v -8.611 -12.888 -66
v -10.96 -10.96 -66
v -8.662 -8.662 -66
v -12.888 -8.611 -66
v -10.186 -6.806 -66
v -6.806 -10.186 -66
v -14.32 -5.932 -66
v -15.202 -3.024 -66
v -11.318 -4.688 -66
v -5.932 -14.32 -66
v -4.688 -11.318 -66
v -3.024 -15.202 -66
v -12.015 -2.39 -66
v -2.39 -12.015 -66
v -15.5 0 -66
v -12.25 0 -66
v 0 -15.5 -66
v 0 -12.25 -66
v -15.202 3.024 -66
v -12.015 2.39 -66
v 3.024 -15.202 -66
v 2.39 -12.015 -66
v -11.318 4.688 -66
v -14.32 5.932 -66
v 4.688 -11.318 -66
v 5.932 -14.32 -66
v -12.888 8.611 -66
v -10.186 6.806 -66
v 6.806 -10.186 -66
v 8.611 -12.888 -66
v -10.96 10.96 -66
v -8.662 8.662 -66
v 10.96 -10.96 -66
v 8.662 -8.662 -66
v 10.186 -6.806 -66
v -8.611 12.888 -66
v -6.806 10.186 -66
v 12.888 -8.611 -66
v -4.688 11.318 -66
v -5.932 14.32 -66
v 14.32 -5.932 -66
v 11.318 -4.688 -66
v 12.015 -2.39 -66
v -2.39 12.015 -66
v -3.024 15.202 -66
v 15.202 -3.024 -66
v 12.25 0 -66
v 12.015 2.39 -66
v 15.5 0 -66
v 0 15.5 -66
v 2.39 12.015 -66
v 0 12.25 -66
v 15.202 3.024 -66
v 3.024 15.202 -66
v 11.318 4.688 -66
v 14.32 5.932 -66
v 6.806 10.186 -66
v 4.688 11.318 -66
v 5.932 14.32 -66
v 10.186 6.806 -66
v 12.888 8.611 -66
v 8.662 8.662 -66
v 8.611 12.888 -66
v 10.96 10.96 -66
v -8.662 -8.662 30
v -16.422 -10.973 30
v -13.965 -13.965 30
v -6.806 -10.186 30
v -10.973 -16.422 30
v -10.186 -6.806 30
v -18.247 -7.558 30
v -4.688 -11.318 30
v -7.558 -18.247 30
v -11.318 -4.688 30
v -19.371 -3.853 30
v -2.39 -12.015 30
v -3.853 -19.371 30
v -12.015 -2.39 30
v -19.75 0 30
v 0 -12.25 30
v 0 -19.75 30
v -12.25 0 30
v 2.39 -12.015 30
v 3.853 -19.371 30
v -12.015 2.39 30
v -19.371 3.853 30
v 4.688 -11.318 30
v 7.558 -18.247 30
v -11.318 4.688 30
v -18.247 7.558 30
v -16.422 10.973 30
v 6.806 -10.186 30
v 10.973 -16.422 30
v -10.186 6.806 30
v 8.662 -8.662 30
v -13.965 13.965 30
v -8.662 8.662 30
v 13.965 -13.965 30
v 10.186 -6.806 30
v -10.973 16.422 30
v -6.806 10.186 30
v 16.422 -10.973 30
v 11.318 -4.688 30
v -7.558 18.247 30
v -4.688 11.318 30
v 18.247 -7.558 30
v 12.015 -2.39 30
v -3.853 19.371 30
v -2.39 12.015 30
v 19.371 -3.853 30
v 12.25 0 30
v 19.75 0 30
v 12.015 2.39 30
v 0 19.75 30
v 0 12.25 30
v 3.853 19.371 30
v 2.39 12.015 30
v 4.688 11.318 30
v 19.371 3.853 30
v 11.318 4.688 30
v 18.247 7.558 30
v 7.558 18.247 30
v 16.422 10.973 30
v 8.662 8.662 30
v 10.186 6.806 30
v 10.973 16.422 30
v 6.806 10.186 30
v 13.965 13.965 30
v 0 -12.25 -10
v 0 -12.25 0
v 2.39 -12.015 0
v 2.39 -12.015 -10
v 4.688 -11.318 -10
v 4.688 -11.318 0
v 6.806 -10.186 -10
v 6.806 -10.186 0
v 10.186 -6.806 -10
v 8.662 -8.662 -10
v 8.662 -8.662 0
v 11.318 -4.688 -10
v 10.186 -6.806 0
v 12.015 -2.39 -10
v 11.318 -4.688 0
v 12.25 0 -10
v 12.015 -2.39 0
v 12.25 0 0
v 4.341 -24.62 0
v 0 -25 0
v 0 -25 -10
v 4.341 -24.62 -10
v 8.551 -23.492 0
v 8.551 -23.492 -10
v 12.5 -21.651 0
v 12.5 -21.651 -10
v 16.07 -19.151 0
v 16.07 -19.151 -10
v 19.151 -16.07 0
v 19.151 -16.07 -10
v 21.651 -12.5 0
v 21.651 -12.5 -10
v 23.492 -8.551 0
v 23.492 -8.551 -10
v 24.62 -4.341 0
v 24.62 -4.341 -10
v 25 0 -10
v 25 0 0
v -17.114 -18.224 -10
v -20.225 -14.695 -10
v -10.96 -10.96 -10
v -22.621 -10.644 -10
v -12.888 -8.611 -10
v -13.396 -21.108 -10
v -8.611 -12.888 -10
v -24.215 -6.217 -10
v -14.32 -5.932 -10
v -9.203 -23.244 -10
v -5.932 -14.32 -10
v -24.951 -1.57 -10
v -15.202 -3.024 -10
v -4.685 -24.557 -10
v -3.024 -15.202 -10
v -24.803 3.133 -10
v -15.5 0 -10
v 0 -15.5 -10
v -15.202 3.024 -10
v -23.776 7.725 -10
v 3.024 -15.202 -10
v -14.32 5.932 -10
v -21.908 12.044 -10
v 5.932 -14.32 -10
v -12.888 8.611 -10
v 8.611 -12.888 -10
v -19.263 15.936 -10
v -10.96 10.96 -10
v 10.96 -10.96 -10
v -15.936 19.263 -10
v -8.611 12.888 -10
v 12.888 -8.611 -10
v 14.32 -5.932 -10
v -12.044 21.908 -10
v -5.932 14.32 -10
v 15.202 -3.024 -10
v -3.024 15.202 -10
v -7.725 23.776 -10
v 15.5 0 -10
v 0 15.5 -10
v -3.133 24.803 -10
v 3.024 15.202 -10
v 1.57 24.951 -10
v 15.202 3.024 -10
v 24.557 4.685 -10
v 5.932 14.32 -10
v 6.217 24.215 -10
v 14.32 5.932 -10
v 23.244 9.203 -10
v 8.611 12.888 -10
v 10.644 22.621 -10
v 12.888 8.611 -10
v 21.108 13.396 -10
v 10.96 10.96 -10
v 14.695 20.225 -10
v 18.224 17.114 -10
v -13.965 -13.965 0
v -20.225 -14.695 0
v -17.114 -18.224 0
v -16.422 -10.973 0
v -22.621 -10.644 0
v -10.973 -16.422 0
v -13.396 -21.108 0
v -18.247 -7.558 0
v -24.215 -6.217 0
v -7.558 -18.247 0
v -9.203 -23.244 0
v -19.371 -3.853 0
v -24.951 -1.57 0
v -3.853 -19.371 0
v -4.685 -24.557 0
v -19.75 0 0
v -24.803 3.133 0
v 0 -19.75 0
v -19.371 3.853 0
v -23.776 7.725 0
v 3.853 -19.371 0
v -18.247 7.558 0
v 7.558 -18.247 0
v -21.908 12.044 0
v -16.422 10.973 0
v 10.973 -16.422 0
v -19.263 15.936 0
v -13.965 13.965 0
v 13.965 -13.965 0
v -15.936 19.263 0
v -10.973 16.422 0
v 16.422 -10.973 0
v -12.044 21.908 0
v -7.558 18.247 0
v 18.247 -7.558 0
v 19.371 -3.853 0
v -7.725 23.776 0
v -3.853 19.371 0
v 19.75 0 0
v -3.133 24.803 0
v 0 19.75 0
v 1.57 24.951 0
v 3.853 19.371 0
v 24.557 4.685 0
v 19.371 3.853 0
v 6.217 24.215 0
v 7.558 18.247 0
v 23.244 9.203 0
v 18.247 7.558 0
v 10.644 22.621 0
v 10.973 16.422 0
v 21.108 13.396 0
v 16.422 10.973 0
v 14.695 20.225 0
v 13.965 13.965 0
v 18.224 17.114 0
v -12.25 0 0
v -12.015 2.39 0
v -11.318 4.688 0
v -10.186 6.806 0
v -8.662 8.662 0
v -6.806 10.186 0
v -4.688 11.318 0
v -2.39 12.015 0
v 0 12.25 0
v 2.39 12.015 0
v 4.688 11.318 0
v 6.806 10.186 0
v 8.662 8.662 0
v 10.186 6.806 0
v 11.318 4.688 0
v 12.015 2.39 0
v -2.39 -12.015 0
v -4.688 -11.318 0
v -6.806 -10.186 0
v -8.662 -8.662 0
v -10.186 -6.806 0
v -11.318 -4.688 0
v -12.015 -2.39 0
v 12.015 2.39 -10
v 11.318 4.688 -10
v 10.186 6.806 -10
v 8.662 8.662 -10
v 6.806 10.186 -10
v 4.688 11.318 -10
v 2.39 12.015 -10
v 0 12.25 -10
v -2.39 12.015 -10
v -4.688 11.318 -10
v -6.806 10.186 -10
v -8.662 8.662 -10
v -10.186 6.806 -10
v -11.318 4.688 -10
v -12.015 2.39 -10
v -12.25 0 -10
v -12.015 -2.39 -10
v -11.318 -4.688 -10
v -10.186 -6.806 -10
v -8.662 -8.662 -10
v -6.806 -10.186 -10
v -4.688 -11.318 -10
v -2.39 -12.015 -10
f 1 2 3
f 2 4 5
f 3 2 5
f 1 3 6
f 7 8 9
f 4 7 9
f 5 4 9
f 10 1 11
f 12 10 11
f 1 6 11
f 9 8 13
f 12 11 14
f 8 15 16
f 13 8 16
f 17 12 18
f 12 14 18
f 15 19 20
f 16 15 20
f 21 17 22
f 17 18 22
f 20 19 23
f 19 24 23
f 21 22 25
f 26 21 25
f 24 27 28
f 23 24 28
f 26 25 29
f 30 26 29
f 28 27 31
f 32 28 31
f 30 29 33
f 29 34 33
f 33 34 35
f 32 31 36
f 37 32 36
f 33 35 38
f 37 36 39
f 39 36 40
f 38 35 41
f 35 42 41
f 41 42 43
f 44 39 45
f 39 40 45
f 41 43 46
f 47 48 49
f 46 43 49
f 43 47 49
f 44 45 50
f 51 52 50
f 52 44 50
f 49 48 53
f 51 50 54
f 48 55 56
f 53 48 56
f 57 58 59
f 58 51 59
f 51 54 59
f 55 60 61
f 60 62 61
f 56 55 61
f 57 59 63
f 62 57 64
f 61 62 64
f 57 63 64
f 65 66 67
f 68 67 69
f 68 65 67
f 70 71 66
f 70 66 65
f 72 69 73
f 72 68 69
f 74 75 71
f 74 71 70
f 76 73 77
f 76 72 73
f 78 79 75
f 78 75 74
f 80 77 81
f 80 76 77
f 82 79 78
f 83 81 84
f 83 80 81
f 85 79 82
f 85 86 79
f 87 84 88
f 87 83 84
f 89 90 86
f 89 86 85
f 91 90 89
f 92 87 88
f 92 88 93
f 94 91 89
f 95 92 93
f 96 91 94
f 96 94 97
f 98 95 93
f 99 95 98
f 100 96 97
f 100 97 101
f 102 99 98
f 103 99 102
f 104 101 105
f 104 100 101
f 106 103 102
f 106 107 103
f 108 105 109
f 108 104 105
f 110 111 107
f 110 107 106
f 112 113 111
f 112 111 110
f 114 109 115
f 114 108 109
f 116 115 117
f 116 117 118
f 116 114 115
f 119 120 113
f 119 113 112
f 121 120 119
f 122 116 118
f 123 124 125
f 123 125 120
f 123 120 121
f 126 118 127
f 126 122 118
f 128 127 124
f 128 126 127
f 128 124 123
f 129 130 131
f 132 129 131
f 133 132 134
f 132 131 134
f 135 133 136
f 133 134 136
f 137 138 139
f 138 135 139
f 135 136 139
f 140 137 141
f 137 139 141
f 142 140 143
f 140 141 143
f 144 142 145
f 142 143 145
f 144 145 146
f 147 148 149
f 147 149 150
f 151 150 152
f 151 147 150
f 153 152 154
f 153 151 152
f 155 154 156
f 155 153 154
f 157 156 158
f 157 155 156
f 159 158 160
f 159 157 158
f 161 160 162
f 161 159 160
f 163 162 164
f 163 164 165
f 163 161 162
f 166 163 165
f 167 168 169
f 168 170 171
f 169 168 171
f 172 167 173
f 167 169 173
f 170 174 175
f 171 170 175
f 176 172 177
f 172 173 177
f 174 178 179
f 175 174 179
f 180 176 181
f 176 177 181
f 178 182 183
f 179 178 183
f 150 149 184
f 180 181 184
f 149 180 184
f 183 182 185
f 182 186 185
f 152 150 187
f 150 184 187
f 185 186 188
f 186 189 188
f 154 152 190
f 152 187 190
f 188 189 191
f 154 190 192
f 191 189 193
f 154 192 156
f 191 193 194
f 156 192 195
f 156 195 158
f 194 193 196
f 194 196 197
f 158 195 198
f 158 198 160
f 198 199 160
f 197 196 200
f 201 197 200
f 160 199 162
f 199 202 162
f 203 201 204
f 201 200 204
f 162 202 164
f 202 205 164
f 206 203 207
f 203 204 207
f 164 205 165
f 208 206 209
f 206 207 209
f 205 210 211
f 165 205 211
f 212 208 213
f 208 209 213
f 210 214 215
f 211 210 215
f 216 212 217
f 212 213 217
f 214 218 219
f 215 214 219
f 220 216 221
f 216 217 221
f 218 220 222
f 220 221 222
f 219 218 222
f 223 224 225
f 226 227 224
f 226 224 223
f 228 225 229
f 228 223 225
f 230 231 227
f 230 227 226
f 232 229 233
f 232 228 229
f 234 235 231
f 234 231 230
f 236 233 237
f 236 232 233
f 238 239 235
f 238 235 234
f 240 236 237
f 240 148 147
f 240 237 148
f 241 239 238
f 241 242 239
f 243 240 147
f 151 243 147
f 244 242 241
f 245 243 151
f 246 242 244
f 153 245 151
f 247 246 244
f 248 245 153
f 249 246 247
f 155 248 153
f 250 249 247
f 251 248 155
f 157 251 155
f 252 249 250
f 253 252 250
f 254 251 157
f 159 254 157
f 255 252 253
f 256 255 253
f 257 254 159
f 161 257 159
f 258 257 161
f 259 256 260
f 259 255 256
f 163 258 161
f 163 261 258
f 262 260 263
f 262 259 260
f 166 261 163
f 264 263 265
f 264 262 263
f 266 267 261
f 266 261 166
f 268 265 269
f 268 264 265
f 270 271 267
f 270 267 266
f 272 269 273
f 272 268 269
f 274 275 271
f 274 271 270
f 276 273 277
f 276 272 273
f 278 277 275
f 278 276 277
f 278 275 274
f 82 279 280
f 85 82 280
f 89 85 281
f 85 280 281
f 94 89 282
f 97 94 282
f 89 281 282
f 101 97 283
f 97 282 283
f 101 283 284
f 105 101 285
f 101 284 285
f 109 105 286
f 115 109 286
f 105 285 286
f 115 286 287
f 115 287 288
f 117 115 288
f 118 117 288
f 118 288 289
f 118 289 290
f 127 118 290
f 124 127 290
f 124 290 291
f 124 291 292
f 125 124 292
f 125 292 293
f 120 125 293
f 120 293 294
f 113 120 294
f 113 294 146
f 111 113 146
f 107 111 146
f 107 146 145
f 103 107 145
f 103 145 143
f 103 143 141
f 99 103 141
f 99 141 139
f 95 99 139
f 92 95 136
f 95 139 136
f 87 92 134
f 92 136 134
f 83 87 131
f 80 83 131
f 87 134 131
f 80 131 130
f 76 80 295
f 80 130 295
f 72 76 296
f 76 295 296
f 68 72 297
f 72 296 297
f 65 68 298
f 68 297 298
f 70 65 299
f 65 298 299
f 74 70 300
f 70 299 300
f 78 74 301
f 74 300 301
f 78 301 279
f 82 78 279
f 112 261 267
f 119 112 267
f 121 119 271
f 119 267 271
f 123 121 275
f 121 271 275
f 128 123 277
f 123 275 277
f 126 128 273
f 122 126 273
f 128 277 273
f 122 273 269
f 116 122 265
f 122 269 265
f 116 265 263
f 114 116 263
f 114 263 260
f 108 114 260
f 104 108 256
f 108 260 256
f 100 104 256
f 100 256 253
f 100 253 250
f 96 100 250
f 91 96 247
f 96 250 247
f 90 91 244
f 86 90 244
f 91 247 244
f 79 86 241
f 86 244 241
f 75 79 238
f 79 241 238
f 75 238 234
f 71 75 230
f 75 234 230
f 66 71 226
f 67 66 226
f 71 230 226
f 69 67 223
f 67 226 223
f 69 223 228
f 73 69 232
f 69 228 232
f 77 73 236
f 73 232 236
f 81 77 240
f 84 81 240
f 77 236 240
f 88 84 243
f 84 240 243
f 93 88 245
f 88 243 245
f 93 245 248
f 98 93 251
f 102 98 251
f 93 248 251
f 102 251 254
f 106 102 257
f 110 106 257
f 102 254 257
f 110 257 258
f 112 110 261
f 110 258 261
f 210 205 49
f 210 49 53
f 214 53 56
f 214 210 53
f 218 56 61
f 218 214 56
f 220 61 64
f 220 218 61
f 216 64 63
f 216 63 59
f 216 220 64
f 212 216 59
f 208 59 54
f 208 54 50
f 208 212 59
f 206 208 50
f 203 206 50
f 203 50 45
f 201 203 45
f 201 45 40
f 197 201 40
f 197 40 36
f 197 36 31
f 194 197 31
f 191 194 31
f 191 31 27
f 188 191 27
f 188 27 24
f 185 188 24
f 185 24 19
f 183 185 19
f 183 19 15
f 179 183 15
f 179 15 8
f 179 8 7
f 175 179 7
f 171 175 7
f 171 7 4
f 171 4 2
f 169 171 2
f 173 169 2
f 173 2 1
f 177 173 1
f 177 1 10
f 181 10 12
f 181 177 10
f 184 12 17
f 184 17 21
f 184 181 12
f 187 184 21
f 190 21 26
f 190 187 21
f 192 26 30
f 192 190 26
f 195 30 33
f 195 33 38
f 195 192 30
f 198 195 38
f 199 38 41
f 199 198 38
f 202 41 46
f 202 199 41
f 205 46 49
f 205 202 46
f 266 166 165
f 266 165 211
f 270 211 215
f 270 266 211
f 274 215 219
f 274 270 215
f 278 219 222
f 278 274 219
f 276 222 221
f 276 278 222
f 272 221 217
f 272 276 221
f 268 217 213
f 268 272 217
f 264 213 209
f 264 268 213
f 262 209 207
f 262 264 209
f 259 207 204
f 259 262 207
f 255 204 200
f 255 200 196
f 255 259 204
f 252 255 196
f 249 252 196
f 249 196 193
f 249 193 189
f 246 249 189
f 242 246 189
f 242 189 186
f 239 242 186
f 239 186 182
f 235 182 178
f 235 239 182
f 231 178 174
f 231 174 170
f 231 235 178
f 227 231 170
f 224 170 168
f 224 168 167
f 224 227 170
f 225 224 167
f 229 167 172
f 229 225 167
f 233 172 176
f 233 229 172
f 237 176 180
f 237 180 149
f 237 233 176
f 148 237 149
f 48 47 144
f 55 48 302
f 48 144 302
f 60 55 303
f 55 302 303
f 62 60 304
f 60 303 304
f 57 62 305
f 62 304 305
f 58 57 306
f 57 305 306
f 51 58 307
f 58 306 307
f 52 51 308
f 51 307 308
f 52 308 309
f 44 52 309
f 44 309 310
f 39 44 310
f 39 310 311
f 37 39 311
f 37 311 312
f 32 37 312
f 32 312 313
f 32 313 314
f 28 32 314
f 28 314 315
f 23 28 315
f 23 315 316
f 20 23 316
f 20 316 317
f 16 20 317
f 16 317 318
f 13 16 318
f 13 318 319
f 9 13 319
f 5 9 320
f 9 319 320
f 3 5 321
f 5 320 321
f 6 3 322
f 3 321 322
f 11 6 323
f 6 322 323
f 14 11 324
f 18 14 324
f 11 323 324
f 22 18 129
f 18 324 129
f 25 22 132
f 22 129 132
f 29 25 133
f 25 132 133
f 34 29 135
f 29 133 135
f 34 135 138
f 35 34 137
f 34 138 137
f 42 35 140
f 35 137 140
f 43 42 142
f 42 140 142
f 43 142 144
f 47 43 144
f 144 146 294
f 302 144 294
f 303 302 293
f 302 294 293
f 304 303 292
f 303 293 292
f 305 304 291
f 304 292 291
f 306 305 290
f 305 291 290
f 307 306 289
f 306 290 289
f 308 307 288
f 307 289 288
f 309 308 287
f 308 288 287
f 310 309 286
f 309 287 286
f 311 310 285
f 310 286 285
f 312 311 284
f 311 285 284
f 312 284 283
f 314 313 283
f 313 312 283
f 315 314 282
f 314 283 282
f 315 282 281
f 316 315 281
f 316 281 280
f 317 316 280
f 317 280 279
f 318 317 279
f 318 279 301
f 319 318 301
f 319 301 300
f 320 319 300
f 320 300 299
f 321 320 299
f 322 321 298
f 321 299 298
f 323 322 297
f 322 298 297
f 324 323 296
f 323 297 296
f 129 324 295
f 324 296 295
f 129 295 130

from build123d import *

# Parameters (mm, degrees)
F1_DEPTH = 30
F2_R     = 15.5
F2_R_2   = 12.25
F3_DEPTH = 66
F5_DEPTH = 10


# Not quite as in the source:
# - a feature names something its author has since deleted; it is built from what else it names


with BuildPart() as f1:
    # F0 (on Top) → F1 (new body)
    with BuildSketch(Plane.XY):
        with BuildLine():
            ThreePointArc((-19.75, 0), (0, -19.75), (19.75, 0))
            ThreePointArc((19.75, 0), (0, 19.75), (-19.75, 0))
        make_face()
        with BuildLine():
            ThreePointArc((12.25, 0), (0, -12.25), (-12.25, 0))
            ThreePointArc((-12.25, 0), (0, 12.25), (12.25, 0))
        make_face(mode=Mode.SUBTRACT)
    extrude(amount=F1_DEPTH)

    # F2 (on Top) → F3 (join)
    with BuildSketch(Plane.XY):
        Circle(F2_R)
        Circle(F2_R_2, mode=Mode.SUBTRACT)
    extrude(amount=-F3_DEPTH)

    # F4 (on Top) → F5 (join)
    with BuildSketch(Plane.XY):
        with BuildLine():
            ThreePointArc((0, -25), (17.6776695297, -17.6776695297), (25, 0))
            ThreePointArc((25, 0), (-17.6776695297, 17.6776695297), (0, -25))
        make_face()
        with BuildLine():
            ThreePointArc((12.25, 0), (8.6620580695, -8.6620580695), (0, -12.25))
            ThreePointArc((0, -12.25), (-8.6620580695, 8.6620580695), (12.25, 0))
        make_face(mode=Mode.SUBTRACT)
    extrude(amount=-F5_DEPTH)


solid = f1.part
